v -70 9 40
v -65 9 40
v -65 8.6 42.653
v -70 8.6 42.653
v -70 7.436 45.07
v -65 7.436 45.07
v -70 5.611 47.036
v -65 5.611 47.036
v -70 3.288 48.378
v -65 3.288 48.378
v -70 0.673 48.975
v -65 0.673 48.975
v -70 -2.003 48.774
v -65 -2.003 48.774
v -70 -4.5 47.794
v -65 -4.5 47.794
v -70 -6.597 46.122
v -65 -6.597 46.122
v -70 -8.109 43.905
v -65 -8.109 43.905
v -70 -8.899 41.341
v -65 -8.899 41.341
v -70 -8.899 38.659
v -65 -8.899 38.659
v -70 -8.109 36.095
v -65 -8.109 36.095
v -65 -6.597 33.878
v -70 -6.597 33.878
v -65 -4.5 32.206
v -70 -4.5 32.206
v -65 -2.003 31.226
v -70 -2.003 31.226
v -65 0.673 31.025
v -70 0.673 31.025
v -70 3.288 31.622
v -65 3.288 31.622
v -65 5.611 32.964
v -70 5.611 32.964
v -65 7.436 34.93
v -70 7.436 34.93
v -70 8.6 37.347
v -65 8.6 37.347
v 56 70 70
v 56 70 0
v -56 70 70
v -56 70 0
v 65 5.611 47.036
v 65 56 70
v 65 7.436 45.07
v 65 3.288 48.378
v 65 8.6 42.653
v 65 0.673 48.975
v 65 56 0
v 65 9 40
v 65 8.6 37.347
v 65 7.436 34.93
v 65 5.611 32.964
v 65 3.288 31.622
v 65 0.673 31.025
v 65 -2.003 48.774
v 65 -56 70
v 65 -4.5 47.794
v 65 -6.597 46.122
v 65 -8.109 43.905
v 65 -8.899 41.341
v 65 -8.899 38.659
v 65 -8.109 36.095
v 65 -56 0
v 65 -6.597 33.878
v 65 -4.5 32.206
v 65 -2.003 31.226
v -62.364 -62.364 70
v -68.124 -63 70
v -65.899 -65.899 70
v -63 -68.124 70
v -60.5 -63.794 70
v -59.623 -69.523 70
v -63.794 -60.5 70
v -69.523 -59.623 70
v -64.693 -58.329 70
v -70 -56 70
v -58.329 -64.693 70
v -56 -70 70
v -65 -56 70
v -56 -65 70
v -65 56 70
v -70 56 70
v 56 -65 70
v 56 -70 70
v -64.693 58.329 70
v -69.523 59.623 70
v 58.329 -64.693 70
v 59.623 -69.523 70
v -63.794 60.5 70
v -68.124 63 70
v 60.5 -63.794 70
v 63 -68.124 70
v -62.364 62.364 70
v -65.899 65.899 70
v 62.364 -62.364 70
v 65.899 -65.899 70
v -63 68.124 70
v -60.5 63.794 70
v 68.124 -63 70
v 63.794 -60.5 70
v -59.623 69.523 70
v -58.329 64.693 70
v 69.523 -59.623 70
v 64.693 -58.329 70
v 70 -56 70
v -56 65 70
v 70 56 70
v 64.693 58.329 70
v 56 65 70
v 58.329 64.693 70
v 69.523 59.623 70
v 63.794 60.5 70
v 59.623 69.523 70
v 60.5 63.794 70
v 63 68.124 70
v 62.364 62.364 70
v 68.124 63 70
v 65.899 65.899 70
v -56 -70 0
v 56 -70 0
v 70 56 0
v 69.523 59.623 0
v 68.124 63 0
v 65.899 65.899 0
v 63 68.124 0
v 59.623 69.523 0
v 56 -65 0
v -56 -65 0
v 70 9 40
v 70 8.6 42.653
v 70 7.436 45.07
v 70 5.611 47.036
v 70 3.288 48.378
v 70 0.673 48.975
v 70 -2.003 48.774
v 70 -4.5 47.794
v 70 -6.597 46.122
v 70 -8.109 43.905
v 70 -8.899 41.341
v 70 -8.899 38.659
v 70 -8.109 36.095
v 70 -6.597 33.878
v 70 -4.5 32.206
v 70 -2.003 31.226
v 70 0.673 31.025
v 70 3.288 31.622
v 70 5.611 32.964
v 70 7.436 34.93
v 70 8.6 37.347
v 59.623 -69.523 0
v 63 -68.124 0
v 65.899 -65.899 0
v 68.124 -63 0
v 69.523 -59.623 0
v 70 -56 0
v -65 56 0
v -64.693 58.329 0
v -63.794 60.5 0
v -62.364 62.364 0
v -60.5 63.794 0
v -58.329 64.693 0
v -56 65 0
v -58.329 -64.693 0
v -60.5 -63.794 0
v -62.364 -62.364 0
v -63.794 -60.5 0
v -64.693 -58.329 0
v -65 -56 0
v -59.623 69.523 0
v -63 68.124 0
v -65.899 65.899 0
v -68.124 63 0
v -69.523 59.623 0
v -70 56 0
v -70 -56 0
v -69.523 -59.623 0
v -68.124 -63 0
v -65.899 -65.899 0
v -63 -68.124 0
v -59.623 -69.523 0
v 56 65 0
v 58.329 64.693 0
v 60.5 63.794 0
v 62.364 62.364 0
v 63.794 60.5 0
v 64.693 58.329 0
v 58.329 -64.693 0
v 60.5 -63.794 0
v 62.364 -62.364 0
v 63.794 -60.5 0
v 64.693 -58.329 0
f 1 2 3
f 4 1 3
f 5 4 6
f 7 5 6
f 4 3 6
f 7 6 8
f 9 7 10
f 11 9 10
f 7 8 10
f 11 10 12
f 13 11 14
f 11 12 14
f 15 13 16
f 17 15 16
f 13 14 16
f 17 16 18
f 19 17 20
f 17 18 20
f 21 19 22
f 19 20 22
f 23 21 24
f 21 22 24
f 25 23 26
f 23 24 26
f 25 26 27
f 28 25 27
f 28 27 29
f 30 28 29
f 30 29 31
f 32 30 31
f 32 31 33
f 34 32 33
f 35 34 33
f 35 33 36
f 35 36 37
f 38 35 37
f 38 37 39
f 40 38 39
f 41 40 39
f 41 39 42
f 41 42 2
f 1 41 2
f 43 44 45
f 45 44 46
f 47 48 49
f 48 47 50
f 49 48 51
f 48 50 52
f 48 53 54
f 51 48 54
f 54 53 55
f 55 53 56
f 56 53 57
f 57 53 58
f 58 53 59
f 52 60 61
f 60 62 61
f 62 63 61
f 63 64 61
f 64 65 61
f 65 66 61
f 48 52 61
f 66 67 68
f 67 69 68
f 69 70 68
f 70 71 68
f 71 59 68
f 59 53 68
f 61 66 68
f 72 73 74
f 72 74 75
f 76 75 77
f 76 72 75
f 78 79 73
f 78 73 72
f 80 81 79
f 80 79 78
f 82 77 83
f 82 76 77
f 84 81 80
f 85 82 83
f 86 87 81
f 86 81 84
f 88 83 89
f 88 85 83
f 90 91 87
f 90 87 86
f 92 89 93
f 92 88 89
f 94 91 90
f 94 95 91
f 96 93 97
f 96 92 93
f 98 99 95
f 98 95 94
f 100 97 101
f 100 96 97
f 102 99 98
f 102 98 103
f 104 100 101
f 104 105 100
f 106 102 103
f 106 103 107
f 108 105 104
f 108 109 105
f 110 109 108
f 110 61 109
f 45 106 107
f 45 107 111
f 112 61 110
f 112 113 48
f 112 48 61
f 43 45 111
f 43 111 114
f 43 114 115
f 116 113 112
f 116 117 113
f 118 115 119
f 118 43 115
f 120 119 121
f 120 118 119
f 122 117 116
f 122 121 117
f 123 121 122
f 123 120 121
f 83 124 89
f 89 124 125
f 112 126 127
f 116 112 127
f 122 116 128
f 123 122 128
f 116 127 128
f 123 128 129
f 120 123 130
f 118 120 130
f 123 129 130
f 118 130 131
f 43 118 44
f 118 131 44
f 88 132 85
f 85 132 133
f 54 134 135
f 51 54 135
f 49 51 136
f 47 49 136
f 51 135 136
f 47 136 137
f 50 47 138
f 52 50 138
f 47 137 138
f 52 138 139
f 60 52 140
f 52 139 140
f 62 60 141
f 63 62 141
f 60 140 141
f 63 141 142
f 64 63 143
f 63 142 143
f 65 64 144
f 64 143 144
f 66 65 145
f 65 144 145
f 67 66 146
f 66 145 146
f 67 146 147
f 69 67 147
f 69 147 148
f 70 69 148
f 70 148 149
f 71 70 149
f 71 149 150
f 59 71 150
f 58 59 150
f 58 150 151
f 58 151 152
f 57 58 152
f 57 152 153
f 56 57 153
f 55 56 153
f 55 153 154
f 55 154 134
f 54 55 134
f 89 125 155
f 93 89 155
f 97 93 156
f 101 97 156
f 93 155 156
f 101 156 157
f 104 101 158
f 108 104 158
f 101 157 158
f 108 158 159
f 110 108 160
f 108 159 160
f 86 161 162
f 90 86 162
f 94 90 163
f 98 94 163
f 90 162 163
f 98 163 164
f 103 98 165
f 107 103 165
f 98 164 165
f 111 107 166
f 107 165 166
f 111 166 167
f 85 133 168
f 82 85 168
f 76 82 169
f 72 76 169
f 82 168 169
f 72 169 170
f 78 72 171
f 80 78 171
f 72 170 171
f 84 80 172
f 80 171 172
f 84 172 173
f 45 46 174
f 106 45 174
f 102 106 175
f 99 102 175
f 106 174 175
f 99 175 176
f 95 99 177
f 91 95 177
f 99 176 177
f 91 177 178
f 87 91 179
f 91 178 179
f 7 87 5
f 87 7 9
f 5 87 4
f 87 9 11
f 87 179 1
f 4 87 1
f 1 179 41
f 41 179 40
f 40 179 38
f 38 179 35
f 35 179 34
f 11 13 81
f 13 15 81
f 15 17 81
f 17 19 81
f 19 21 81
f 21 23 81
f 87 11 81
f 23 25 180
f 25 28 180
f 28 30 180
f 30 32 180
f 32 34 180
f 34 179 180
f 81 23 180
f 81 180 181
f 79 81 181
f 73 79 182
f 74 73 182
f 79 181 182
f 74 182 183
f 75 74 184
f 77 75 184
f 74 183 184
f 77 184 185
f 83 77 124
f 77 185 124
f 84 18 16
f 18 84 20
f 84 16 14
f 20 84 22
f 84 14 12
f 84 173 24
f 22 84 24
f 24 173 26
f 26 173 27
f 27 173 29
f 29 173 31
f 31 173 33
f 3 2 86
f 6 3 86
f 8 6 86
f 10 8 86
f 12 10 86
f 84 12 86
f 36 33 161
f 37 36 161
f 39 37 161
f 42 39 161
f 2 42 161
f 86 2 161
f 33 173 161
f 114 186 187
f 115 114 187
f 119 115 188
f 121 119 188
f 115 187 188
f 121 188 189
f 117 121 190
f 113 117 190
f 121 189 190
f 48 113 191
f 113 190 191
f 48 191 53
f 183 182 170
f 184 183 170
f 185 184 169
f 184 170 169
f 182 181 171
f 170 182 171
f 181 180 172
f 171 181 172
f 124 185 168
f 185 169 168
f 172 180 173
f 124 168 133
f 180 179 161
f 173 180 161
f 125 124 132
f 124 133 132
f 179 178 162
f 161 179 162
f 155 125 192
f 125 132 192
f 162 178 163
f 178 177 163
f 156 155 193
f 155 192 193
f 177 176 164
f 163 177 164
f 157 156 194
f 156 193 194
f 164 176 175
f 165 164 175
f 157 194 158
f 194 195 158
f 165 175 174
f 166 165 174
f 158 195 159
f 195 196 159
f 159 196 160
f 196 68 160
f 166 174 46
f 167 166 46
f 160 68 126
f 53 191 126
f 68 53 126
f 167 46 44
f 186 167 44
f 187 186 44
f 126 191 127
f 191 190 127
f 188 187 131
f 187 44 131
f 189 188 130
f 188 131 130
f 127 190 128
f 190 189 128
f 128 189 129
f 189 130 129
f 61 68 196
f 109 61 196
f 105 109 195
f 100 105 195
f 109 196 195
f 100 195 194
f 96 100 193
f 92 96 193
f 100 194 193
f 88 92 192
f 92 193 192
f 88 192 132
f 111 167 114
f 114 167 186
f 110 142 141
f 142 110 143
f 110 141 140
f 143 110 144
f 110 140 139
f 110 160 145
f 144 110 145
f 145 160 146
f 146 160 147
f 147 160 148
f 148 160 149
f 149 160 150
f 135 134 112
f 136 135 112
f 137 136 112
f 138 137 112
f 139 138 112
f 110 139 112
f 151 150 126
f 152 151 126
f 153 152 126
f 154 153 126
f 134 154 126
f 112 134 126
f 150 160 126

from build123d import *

# Parameters (mm, degrees)
F1_DEPTH = 70
F2_R     = 9
F3_DEPTH = 140.001


with BuildPart() as f1:
    # F0 (on Top) → F1 (new body)
    with BuildSketch(Plane.XY):
        with BuildLine():
            Line((-56, -70), (56, -70))
            ThreePointArc((56, -70), (65.899495, -65.899495), (70, -56))
            Line((70, -56), (70, 56))
            ThreePointArc((70, 56), (65.899495, 65.899495), (56, 70))
            Line((56, 70), (-56, 70))
            ThreePointArc((-56, 70), (-65.899495, 65.899495), (-70, 56))
            Line((-70, 56), (-70, -56))
            ThreePointArc((-70, -56), (-65.899495, -65.899495), (-56, -70))
        make_face()
        with BuildLine():
            ThreePointArc((-56, -65), (-62.363961, -62.363961), (-65, -56))
            Line((-65, -56), (-65, 56))
            ThreePointArc((-65, 56), (-62.363961, 62.363961), (-56, 65))
            Line((-56, 65), (56, 65))
            ThreePointArc((56, 65), (62.363961, 62.363961), (65, 56))
            Line((65, 56), (65, -56))
            ThreePointArc((65, -56), (62.363961, -62.363961), (56, -65))
            Line((56, -65), (-56, -65))
        make_face(mode=Mode.SUBTRACT)
    extrude(amount=F1_DEPTH)

    # F2 (on face) → F3 (cut, through all)
    with BuildSketch(Plane.YZ.offset(70)):
        with Locations((0, 40)):
            Circle(F2_R)
    extrude(amount=-F3_DEPTH, mode=Mode.SUBTRACT)


solid = f1.part
